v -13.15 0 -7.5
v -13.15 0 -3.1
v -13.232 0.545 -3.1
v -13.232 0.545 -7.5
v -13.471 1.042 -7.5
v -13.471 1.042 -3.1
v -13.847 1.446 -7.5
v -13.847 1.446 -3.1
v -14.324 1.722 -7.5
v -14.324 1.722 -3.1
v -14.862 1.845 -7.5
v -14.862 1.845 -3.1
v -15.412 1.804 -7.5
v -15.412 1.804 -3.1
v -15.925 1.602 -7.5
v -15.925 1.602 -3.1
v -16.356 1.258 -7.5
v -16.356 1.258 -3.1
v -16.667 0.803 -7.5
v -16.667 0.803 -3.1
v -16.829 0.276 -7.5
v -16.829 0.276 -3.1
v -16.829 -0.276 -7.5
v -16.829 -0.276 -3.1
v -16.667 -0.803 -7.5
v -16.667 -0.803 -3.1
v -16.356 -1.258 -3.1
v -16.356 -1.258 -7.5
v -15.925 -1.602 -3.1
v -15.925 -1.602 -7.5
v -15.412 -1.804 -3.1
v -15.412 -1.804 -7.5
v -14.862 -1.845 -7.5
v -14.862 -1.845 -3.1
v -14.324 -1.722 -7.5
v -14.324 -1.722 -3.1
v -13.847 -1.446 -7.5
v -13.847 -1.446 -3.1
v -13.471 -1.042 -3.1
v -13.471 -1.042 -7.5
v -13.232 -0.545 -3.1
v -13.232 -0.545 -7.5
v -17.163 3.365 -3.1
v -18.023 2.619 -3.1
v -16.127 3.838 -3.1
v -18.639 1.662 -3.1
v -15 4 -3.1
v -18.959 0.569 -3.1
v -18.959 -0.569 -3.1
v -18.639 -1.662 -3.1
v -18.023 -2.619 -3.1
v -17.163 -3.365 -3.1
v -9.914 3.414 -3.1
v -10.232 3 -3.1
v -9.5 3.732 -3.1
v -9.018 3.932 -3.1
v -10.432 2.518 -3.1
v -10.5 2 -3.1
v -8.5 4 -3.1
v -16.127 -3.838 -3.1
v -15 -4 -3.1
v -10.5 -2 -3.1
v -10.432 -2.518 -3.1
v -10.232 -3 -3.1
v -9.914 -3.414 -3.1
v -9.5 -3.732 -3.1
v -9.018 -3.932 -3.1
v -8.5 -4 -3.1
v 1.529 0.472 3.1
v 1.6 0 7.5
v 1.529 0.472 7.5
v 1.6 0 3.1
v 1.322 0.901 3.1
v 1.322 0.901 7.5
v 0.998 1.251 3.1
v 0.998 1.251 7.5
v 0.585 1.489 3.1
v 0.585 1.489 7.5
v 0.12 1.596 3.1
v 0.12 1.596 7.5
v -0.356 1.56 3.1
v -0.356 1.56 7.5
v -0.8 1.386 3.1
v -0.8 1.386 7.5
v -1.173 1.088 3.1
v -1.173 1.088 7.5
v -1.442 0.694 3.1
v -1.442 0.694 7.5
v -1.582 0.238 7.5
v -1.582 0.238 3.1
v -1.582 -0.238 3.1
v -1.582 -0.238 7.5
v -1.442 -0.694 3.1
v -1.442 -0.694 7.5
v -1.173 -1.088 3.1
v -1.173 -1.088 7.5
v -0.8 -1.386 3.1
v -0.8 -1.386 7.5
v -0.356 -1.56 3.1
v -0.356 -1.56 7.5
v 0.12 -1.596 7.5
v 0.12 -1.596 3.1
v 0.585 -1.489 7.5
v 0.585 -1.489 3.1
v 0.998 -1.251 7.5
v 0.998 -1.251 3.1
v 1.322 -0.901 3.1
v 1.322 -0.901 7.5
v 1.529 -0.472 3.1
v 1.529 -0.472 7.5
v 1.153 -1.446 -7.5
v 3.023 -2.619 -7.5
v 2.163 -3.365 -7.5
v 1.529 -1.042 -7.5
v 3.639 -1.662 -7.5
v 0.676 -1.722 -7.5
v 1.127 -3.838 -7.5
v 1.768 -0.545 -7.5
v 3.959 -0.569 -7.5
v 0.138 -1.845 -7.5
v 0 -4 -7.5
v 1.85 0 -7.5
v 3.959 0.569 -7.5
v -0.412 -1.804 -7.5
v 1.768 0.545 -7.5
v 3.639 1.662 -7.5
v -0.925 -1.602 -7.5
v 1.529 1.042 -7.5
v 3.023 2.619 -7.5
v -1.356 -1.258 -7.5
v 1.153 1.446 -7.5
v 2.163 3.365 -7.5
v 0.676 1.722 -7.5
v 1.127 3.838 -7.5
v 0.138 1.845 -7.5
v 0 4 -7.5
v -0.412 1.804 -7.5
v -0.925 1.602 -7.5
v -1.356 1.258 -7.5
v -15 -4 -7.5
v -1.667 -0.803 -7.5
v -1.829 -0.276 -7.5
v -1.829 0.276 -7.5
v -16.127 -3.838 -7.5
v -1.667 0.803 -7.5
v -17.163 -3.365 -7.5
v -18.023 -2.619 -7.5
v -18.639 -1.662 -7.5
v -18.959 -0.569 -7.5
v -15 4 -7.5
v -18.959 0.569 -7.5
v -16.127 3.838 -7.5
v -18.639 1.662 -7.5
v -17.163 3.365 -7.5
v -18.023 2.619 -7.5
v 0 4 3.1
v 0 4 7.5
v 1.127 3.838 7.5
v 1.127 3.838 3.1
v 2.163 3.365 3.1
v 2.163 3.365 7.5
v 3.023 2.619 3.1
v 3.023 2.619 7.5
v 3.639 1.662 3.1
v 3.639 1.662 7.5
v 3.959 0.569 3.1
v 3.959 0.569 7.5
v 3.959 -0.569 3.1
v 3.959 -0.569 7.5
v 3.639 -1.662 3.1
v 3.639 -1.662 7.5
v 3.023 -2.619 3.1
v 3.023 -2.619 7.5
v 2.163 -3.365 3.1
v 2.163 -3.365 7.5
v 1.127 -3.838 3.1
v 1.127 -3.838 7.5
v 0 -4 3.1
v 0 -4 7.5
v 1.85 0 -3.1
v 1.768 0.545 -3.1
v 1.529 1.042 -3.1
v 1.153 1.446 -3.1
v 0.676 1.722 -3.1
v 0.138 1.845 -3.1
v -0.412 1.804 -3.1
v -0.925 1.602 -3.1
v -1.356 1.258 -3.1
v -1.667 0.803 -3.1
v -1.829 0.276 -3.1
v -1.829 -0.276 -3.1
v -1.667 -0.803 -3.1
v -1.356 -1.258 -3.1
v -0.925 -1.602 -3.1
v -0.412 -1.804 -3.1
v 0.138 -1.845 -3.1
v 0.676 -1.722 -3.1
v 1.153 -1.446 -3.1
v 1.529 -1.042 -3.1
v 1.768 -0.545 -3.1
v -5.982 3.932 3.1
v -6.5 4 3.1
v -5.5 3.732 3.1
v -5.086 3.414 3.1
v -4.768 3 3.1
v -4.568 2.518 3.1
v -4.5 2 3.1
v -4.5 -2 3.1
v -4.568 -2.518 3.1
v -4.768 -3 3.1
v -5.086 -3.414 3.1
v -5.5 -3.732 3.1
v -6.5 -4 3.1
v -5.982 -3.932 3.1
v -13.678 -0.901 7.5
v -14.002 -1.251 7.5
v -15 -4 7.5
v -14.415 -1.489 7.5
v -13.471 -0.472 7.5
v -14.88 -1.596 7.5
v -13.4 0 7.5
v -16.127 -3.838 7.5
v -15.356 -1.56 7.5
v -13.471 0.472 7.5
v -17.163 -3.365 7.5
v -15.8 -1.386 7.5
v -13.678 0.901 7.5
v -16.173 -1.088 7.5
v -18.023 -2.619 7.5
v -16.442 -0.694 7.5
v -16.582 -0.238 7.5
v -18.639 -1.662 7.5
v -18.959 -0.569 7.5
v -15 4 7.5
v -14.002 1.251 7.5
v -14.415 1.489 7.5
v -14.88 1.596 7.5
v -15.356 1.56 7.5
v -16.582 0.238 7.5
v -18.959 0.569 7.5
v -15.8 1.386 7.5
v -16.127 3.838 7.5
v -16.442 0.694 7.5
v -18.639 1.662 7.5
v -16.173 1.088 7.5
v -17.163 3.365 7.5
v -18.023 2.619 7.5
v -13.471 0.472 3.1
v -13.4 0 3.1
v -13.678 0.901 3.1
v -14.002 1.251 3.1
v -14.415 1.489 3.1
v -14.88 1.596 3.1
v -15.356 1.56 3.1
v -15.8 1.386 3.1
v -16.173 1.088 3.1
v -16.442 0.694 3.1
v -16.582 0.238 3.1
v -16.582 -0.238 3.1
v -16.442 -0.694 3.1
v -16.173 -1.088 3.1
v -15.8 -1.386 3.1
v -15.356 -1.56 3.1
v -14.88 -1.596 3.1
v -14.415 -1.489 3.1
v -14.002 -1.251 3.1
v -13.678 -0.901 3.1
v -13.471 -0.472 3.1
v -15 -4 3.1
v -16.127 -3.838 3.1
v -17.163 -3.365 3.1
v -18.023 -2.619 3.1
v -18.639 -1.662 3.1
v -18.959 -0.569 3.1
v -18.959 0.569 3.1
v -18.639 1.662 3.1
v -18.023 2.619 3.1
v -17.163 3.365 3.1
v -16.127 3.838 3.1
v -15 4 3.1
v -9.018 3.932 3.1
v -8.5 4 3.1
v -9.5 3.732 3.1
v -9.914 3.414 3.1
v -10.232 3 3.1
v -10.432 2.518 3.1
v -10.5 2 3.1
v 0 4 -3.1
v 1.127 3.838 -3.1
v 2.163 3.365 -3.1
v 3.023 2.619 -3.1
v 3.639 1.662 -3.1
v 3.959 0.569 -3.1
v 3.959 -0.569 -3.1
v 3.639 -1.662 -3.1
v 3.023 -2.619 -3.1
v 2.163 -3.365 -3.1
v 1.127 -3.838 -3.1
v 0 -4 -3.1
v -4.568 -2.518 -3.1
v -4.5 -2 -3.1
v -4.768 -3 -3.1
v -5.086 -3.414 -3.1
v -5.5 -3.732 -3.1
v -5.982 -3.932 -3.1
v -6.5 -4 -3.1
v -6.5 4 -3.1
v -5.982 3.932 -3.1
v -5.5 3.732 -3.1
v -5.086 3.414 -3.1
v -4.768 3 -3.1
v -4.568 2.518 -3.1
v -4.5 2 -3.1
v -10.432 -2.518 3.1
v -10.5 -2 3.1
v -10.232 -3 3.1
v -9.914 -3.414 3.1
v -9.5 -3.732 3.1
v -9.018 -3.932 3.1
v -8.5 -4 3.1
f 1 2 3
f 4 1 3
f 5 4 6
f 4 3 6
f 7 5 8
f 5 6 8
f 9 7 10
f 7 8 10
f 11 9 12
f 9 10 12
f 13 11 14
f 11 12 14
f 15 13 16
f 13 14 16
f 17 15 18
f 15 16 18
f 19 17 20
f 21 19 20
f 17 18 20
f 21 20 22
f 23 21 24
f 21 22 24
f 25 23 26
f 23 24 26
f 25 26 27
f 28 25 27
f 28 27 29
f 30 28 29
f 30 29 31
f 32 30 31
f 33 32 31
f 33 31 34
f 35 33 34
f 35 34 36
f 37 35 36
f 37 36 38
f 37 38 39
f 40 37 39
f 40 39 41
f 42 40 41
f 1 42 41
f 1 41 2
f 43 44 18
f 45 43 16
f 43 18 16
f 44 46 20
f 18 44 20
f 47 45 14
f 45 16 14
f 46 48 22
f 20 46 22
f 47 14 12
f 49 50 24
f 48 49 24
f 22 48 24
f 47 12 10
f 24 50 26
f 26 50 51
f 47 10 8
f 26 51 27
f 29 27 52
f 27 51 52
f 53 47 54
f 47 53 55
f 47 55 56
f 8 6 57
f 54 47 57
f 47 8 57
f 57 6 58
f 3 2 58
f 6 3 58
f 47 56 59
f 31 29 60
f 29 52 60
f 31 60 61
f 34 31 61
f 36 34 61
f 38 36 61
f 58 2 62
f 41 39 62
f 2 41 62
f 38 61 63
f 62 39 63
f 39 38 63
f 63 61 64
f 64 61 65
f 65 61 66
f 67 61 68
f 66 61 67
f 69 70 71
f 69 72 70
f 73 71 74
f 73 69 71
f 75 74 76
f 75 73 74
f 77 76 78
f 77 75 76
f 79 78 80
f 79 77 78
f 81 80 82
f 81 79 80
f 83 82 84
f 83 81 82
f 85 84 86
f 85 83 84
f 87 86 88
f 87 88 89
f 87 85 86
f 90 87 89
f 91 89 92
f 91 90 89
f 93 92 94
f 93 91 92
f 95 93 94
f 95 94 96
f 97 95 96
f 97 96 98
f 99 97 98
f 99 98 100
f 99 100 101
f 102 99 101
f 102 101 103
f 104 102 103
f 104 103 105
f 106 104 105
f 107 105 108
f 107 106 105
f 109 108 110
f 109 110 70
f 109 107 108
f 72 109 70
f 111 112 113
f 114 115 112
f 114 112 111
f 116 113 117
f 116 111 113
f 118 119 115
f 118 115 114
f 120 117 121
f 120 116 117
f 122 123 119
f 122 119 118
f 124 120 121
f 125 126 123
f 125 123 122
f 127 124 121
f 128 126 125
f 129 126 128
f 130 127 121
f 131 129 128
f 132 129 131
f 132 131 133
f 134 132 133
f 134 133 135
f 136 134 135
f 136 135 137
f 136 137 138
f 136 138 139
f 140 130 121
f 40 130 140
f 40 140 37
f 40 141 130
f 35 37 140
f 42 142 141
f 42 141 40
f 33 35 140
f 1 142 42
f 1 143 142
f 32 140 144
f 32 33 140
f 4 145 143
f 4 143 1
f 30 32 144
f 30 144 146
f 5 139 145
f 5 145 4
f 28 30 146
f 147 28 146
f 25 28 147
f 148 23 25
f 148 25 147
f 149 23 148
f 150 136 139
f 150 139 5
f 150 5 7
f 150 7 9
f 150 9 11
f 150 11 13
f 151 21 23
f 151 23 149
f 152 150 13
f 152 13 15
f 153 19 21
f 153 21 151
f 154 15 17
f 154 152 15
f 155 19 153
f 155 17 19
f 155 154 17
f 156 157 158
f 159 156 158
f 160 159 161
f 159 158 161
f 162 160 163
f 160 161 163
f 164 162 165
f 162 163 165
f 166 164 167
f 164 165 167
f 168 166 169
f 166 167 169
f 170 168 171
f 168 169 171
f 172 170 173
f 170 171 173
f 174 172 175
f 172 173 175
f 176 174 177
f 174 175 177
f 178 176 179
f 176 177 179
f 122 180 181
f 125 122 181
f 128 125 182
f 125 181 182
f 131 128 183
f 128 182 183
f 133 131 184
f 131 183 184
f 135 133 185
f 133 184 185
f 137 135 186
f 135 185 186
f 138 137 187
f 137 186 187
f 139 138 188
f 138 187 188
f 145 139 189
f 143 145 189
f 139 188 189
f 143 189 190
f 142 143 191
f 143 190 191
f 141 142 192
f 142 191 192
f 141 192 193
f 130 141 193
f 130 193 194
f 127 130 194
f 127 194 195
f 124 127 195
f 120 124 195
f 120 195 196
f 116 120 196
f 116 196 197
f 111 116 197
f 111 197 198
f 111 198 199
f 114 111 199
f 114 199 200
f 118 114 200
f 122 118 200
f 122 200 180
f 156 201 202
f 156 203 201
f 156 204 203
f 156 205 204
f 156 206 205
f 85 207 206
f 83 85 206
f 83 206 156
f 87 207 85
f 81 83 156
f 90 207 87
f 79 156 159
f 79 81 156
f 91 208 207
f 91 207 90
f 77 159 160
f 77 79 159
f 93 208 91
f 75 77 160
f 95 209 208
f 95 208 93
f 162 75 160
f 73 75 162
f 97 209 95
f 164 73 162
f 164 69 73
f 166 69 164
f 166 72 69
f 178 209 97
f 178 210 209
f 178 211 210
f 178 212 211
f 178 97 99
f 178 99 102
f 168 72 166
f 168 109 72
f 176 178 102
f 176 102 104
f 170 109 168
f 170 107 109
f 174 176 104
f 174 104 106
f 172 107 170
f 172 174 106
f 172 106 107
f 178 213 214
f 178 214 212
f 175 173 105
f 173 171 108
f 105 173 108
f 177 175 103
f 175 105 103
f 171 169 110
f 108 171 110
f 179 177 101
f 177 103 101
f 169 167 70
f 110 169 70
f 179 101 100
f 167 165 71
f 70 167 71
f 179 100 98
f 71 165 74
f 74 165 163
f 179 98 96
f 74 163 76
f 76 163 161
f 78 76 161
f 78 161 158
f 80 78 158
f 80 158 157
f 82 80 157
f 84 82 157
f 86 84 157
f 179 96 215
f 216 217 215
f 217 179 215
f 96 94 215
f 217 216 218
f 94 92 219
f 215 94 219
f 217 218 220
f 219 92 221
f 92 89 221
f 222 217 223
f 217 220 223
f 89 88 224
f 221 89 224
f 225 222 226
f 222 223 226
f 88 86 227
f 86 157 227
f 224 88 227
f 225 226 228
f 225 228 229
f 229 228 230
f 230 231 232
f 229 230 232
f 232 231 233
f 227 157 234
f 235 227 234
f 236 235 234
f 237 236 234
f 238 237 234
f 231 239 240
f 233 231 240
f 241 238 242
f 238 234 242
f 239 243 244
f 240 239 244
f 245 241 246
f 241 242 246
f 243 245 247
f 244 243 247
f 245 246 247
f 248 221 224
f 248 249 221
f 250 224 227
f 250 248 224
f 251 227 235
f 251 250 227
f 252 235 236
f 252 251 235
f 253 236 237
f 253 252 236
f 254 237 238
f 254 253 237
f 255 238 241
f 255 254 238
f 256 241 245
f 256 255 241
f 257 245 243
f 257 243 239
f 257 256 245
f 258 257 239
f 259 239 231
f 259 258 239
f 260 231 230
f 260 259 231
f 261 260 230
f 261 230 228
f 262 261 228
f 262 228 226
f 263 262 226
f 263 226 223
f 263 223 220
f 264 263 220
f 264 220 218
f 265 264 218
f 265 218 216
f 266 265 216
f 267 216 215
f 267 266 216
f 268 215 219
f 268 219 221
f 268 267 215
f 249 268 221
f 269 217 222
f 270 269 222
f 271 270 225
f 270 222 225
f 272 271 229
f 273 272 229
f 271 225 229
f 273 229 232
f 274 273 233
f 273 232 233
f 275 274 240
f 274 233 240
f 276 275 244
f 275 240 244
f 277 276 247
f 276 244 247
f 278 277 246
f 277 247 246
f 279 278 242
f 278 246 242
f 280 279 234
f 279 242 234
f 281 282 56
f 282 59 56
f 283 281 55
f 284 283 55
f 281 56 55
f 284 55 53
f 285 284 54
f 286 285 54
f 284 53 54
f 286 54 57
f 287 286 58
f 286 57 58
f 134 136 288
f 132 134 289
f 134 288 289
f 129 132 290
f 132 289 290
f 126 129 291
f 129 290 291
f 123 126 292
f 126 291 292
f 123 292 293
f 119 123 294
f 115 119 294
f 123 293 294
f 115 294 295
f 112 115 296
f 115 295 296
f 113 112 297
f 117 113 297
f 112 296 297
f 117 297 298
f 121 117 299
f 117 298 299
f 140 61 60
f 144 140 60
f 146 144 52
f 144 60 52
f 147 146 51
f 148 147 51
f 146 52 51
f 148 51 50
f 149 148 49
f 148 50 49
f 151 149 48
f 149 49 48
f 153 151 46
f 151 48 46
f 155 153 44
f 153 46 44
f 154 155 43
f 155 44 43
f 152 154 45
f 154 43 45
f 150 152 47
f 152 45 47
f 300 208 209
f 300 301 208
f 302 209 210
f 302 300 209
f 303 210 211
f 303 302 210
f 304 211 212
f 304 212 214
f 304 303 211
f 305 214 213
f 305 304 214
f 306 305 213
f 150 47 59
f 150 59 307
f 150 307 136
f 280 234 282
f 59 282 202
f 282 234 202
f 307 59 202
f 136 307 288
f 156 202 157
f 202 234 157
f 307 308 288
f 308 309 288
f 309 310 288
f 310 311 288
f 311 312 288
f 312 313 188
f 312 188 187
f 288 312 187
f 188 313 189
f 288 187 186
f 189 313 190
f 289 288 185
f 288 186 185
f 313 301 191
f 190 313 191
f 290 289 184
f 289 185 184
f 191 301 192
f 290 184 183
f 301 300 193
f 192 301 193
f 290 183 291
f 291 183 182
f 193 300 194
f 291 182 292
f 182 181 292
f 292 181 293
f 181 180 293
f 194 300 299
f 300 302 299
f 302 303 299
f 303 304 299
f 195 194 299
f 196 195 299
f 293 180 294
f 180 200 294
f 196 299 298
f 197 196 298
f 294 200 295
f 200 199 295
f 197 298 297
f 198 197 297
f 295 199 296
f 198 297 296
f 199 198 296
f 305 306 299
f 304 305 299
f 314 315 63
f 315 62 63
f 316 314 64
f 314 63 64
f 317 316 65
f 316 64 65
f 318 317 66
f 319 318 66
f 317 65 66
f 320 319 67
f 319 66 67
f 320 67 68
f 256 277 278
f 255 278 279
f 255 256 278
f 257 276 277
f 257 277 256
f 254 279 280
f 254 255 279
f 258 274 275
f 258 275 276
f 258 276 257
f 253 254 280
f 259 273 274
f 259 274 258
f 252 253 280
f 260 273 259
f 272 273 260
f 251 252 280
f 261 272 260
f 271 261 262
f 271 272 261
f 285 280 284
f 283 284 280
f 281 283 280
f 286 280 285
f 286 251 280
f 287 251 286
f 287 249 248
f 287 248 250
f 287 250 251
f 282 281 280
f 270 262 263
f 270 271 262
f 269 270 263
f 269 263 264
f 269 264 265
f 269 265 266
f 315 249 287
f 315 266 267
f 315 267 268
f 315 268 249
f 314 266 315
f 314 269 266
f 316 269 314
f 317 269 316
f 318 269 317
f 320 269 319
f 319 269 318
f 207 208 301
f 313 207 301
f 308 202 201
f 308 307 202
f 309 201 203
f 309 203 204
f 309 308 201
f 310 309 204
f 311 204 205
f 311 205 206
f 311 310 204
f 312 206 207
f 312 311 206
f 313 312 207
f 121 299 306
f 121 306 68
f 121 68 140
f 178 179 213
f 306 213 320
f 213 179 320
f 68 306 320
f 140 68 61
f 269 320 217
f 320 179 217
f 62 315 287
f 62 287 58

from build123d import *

# Parameters (mm, degrees)
SKETCH1_R               = 1.6
BOSS_EXTRUDE1_DEPTH     = 7.5
SKETCH2_W               = 10
SKETCH2_H               = 6.2
CUT_EXTRUDE1_DEPTH      = 5
CUT_EXTRUDE1_DEPTH_BACK = 5
HOLE1_D                 = 3.7
HOLE1_DEPTH             = 4.4
FILLET1_R               = 2


with BuildPart() as part:
    # Sketch1 → Boss-Extrude1 (new body, symmetric)
    with BuildSketch(Plane.XY):
        with BuildLine():
            Line((-15, 4), (0, 4))
            ThreePointArc((0, 4), (4, 0), (0, -4))
            Line((0, -4), (-15, -4))
            ThreePointArc((-15, -4), (-19, 0), (-15, 4))
        make_face()
        Circle(SKETCH1_R, mode=Mode.SUBTRACT)
        with Locations((-15, 0)):
            Circle(SKETCH1_R, mode=Mode.SUBTRACT)
    extrude(amount=BOSS_EXTRUDE1_DEPTH, both=True)

    # Sketch2 → Cut-Extrude1 (cut, two sides)
    with BuildSketch(Plane(origin=(0, 0, 0), x_dir=(1, 0, 0), z_dir=(0, 1, 0))) as cut_extrude1_sk:
        with Locations((0.5, 0)):
            Rectangle(SKETCH2_W, SKETCH2_H)
        with Locations((-15.5, 0)):
            Rectangle(SKETCH2_W, SKETCH2_H)
    extrude(amount=CUT_EXTRUDE1_DEPTH, mode=Mode.SUBTRACT)
    extrude(cut_extrude1_sk.sketch, amount=-CUT_EXTRUDE1_DEPTH_BACK, mode=Mode.SUBTRACT)

    # Hole1
    with Locations(Plane(origin=(0, 0, -7.5), x_dir=(-1, 0, 0), z_dir=(0, 0, -1))):
        with Locations((0, 0), (15, 0)):
            Hole(HOLE1_D / 2, depth=HOLE1_DEPTH)

    # Fillet1
    fillet1_edges = [part.edges().sort_by_distance(p)[0] for p in [
        (-4.5, -4, 0),
        (-4.5, 4, 0),
        (-10.5, -4, 0),
        (-10.5, 4, 0),
    ]]
    fillet(fillet1_edges, radius=FILLET1_R)


solid = part.part
